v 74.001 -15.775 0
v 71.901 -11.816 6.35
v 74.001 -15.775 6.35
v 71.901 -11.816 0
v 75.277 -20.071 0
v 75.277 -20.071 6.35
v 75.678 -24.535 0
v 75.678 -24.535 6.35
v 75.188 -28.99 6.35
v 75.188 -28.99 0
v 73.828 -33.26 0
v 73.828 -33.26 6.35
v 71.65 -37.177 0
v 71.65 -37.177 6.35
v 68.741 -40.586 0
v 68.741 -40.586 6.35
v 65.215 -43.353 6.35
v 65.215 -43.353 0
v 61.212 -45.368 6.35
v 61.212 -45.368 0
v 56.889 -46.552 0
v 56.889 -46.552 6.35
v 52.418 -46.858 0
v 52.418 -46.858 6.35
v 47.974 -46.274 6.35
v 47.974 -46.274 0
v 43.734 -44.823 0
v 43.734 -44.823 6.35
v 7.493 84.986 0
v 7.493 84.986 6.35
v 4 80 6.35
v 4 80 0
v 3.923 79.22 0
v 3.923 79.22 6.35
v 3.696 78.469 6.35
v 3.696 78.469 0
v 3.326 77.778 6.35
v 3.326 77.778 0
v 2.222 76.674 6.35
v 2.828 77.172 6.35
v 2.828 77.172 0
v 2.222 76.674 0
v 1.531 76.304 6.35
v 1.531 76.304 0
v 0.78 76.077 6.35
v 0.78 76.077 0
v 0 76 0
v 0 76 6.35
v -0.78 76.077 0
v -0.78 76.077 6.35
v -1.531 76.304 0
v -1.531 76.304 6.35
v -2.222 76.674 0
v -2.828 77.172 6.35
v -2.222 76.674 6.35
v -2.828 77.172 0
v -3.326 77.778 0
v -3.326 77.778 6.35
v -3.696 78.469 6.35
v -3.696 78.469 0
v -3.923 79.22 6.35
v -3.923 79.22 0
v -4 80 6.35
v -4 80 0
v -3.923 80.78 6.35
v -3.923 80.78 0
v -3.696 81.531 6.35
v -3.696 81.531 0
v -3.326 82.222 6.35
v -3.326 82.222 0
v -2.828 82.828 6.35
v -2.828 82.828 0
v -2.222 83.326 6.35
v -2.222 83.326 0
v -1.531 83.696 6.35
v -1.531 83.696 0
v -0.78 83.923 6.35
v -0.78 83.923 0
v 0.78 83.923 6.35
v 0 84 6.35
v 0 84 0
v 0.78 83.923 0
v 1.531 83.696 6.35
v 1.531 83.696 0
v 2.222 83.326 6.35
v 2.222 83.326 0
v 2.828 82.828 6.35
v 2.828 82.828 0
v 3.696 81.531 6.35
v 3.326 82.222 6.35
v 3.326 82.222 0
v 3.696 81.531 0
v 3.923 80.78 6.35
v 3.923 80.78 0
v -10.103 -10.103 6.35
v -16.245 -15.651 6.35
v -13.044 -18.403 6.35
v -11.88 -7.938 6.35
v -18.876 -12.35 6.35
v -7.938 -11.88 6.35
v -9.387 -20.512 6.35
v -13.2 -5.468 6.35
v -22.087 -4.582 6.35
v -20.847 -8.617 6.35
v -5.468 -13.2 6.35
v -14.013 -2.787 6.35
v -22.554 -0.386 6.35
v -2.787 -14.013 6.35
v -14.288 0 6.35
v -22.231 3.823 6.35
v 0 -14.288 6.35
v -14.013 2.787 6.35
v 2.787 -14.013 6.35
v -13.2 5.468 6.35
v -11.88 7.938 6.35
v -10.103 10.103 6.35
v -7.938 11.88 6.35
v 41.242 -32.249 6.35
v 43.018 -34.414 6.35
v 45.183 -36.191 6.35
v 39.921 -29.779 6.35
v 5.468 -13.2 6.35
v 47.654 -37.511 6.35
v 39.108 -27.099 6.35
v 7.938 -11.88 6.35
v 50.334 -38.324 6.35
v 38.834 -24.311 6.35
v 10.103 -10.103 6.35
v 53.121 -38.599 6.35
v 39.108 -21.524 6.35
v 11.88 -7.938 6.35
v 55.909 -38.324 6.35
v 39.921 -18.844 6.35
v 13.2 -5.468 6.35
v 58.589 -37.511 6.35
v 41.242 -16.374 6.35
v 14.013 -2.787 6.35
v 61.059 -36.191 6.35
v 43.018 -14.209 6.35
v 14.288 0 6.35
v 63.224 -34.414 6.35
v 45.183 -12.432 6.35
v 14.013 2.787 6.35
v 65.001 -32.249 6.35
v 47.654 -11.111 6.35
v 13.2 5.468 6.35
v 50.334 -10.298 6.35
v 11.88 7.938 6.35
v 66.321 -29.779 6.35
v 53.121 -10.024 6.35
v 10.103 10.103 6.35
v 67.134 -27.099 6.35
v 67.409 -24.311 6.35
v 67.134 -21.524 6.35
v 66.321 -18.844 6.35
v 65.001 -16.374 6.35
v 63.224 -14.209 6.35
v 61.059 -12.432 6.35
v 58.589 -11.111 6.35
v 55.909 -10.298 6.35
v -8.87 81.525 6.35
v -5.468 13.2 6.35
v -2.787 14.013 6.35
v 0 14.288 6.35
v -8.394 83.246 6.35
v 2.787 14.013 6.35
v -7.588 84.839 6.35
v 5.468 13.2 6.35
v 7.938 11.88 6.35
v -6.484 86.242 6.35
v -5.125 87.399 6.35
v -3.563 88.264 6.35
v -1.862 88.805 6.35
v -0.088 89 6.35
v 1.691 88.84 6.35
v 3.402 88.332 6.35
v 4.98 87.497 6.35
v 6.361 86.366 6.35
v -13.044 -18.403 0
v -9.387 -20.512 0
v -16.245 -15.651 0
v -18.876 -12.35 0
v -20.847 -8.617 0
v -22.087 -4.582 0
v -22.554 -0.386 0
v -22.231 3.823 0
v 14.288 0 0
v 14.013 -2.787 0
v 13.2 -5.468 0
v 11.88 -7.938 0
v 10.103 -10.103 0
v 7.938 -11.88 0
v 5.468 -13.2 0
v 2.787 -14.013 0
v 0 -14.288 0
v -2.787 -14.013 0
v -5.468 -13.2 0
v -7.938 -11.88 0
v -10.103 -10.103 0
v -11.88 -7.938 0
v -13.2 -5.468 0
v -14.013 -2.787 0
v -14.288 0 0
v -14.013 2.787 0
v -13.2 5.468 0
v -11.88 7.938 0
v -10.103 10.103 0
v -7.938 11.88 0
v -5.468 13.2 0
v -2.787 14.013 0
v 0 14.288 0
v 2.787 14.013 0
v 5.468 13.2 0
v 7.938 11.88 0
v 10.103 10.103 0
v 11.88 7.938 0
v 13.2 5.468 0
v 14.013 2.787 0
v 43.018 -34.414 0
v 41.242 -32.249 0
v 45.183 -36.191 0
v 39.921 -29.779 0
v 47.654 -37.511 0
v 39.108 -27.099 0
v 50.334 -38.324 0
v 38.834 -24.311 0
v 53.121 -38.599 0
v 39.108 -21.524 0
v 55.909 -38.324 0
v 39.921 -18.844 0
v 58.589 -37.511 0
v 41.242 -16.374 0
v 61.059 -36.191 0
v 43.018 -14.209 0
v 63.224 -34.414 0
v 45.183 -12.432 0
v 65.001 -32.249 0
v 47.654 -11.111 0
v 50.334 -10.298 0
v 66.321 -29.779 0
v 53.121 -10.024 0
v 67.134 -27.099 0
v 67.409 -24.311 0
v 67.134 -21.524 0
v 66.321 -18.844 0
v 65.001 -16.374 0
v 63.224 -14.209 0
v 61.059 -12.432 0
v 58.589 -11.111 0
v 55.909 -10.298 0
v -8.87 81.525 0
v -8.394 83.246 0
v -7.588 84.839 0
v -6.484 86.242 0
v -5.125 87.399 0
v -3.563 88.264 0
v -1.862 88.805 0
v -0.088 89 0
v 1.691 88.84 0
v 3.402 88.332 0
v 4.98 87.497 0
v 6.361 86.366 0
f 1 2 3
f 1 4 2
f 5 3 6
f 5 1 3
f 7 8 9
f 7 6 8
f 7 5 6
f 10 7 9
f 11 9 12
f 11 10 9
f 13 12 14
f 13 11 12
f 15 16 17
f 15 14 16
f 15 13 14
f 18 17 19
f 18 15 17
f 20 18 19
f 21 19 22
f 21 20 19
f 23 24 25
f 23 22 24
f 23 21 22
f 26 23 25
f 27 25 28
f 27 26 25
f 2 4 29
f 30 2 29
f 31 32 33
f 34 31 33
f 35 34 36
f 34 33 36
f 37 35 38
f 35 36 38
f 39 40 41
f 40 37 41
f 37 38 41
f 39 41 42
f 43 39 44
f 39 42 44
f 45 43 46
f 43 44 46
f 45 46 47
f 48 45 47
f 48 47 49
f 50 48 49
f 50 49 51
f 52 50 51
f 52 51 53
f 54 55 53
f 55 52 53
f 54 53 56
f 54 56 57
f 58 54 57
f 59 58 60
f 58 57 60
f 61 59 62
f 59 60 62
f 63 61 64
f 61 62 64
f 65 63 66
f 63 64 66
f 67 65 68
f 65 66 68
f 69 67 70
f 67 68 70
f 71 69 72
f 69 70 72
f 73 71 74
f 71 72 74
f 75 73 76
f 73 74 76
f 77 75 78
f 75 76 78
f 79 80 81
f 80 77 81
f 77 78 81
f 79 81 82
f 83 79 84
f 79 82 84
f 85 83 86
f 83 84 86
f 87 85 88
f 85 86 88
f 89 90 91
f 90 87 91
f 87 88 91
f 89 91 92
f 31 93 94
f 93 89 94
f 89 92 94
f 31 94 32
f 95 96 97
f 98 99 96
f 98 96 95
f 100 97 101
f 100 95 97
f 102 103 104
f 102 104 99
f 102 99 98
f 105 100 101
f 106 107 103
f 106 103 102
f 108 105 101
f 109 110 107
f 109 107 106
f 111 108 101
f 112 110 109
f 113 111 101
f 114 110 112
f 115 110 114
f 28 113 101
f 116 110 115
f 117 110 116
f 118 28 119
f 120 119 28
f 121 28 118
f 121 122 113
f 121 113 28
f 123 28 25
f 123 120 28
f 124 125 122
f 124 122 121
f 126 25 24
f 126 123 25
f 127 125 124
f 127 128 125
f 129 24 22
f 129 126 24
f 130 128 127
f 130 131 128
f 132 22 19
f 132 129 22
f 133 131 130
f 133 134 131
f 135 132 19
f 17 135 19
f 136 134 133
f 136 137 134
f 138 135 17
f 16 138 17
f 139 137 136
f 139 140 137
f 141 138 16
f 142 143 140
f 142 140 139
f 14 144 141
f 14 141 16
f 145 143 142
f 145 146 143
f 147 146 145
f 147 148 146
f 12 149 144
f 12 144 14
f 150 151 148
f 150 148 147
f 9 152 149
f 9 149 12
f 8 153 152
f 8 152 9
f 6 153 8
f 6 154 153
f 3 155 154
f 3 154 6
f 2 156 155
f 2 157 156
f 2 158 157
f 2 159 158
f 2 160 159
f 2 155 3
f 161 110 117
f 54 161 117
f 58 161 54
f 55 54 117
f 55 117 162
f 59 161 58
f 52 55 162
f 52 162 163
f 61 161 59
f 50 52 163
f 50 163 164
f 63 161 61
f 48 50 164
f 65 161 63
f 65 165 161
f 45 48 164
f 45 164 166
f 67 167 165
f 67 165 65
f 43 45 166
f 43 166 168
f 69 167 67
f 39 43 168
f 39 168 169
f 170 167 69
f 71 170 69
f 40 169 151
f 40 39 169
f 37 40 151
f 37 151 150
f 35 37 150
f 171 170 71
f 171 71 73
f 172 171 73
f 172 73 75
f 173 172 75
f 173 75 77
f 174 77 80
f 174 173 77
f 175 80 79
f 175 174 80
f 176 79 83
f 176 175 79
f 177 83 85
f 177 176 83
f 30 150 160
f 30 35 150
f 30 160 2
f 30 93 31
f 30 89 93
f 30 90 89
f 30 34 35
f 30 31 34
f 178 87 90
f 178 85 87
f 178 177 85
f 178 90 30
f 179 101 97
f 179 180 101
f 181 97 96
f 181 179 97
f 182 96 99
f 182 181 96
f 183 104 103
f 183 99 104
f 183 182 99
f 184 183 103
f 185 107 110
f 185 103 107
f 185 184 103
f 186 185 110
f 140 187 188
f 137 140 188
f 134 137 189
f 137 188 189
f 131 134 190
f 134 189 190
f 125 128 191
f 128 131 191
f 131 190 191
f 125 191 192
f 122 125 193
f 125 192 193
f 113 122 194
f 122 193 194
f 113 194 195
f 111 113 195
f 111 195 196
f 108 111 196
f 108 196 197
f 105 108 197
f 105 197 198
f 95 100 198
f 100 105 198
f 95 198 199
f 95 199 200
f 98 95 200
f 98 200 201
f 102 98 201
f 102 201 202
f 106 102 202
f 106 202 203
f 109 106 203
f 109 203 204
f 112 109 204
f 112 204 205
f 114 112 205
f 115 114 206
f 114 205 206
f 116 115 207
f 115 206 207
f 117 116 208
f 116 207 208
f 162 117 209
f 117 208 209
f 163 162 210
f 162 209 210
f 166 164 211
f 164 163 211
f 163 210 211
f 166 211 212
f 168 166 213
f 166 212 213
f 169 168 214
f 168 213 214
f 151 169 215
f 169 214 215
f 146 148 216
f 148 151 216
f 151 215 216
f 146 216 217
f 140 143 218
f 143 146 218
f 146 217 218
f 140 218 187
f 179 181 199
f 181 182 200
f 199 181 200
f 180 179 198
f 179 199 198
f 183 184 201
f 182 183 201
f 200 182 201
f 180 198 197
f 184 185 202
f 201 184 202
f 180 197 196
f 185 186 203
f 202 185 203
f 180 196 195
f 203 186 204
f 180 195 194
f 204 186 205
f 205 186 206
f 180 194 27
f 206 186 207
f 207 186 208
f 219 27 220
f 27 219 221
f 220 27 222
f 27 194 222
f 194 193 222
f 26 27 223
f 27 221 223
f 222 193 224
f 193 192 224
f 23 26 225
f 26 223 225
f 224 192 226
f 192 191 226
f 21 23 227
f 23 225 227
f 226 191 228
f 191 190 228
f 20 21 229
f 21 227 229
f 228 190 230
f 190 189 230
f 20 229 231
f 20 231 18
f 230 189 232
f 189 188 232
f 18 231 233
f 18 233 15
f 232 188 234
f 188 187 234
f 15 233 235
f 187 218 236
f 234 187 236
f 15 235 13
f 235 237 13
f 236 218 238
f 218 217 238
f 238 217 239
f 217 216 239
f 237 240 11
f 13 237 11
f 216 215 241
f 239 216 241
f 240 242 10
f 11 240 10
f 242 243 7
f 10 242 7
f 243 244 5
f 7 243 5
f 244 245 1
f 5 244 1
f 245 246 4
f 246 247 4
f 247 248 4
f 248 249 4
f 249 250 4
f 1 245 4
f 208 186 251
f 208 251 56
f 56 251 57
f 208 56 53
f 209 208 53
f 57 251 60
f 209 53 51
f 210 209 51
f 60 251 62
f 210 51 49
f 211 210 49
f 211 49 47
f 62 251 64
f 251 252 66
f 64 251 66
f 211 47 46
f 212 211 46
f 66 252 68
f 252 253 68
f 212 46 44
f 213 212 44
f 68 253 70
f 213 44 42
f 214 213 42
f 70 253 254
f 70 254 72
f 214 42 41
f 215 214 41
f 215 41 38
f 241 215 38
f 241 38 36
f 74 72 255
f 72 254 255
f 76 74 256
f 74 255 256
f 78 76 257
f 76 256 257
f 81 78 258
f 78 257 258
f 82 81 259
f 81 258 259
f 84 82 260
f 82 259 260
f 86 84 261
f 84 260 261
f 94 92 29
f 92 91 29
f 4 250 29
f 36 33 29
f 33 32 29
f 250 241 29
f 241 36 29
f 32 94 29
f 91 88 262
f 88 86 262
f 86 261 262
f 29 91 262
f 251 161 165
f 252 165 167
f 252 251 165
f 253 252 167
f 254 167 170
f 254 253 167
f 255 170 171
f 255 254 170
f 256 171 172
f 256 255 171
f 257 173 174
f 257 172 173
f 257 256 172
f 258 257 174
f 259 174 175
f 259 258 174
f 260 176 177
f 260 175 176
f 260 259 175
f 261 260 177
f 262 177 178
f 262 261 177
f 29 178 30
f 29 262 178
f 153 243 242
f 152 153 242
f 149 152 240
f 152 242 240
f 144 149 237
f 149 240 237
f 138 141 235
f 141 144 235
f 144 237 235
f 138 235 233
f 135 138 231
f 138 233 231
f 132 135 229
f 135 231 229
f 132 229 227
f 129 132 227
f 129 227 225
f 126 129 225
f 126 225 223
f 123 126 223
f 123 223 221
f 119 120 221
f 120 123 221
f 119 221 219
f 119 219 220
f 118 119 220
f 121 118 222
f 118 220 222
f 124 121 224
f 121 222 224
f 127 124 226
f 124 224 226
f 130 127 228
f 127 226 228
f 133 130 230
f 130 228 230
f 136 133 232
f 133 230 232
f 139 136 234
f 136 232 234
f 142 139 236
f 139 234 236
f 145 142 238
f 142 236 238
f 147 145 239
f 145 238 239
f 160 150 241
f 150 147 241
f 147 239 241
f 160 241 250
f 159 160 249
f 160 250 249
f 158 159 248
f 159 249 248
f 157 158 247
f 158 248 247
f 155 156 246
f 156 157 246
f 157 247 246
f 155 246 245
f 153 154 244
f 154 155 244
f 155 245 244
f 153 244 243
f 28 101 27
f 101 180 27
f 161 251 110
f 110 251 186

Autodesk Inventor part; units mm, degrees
ref_plane "YZ Plane" through (0, 0, 0) normal (1, 0, 0) x (0, 1, 0)
ref_plane "XZ Plane" through (0, 0, 0) normal (0, 1, 0) x (-1, 0, 0)
ref_plane "XY Plane" through (0, 0, 0) normal (0, 0, 1) x (1, 0, 0)
sketch "Sketch1" plane through (0, 0, 0) normal (0, 0, 1) x (1, 0, 0)
  circle A0 centre (0, 0) radius 14.2875
  circle A1 centre (53.1212, -24.3113) radius 14.2875
  circle A2 centre (0, 80) radius 4
  line L0 (0, 80) -> (0, 0) construction
  line L1 (0, 0) -> (53.1212, -24.3113) construction
  circle A3 centre (53.1212, -24.3113) radius 15.5575
  circle A4 centre (0, 0) radius 15.5575
  arc A5 (43.7339, -44.8228) -> (71.9014, -11.8155) centre (53.1212, -24.3113) ccw
  arc A6 (-22.2312, 3.8228) -> (-9.3872, -20.5115) centre (0, 0) ccw
  arc A7 (7.4929, 84.9856) -> (-8.8698, 81.5252) centre (0, 80) ccw
  line L2 (-8.8698, 81.5252) -> (-22.2312, 3.8228)
  line L3 (-9.3872, -20.5115) -> (43.7339, -44.8228)
  line L4 (71.9014, -11.8155) -> (7.4929, 84.9856)
  dimension "d0" = 8
  dimension "d1" = 28.575
  dimension "d4" = 28.575
  dimension "d5" = 58.42
  dimension "d6" = 114.592
  dimension "d7" = 80
  dimension "d8" = 31.115
  dimension "d9" = 31.115
  dimension "d10" = 5
  dimension "d11" = 7
  dimension "d13" = 7
extrude "Extrusion1" add sketch "Sketch1" along normal blind 6.35 contours A3 | A4 | L3 A6 L2 A7 L4 A5
equation "\"d4\" = d1"
equation "\"d6\" = d2"
equation "\"d9\" = d8"
equation "\"d13\" = d11"
equation "\"d2\" = 114.591559deg"
properties part number "sussy pivot"
